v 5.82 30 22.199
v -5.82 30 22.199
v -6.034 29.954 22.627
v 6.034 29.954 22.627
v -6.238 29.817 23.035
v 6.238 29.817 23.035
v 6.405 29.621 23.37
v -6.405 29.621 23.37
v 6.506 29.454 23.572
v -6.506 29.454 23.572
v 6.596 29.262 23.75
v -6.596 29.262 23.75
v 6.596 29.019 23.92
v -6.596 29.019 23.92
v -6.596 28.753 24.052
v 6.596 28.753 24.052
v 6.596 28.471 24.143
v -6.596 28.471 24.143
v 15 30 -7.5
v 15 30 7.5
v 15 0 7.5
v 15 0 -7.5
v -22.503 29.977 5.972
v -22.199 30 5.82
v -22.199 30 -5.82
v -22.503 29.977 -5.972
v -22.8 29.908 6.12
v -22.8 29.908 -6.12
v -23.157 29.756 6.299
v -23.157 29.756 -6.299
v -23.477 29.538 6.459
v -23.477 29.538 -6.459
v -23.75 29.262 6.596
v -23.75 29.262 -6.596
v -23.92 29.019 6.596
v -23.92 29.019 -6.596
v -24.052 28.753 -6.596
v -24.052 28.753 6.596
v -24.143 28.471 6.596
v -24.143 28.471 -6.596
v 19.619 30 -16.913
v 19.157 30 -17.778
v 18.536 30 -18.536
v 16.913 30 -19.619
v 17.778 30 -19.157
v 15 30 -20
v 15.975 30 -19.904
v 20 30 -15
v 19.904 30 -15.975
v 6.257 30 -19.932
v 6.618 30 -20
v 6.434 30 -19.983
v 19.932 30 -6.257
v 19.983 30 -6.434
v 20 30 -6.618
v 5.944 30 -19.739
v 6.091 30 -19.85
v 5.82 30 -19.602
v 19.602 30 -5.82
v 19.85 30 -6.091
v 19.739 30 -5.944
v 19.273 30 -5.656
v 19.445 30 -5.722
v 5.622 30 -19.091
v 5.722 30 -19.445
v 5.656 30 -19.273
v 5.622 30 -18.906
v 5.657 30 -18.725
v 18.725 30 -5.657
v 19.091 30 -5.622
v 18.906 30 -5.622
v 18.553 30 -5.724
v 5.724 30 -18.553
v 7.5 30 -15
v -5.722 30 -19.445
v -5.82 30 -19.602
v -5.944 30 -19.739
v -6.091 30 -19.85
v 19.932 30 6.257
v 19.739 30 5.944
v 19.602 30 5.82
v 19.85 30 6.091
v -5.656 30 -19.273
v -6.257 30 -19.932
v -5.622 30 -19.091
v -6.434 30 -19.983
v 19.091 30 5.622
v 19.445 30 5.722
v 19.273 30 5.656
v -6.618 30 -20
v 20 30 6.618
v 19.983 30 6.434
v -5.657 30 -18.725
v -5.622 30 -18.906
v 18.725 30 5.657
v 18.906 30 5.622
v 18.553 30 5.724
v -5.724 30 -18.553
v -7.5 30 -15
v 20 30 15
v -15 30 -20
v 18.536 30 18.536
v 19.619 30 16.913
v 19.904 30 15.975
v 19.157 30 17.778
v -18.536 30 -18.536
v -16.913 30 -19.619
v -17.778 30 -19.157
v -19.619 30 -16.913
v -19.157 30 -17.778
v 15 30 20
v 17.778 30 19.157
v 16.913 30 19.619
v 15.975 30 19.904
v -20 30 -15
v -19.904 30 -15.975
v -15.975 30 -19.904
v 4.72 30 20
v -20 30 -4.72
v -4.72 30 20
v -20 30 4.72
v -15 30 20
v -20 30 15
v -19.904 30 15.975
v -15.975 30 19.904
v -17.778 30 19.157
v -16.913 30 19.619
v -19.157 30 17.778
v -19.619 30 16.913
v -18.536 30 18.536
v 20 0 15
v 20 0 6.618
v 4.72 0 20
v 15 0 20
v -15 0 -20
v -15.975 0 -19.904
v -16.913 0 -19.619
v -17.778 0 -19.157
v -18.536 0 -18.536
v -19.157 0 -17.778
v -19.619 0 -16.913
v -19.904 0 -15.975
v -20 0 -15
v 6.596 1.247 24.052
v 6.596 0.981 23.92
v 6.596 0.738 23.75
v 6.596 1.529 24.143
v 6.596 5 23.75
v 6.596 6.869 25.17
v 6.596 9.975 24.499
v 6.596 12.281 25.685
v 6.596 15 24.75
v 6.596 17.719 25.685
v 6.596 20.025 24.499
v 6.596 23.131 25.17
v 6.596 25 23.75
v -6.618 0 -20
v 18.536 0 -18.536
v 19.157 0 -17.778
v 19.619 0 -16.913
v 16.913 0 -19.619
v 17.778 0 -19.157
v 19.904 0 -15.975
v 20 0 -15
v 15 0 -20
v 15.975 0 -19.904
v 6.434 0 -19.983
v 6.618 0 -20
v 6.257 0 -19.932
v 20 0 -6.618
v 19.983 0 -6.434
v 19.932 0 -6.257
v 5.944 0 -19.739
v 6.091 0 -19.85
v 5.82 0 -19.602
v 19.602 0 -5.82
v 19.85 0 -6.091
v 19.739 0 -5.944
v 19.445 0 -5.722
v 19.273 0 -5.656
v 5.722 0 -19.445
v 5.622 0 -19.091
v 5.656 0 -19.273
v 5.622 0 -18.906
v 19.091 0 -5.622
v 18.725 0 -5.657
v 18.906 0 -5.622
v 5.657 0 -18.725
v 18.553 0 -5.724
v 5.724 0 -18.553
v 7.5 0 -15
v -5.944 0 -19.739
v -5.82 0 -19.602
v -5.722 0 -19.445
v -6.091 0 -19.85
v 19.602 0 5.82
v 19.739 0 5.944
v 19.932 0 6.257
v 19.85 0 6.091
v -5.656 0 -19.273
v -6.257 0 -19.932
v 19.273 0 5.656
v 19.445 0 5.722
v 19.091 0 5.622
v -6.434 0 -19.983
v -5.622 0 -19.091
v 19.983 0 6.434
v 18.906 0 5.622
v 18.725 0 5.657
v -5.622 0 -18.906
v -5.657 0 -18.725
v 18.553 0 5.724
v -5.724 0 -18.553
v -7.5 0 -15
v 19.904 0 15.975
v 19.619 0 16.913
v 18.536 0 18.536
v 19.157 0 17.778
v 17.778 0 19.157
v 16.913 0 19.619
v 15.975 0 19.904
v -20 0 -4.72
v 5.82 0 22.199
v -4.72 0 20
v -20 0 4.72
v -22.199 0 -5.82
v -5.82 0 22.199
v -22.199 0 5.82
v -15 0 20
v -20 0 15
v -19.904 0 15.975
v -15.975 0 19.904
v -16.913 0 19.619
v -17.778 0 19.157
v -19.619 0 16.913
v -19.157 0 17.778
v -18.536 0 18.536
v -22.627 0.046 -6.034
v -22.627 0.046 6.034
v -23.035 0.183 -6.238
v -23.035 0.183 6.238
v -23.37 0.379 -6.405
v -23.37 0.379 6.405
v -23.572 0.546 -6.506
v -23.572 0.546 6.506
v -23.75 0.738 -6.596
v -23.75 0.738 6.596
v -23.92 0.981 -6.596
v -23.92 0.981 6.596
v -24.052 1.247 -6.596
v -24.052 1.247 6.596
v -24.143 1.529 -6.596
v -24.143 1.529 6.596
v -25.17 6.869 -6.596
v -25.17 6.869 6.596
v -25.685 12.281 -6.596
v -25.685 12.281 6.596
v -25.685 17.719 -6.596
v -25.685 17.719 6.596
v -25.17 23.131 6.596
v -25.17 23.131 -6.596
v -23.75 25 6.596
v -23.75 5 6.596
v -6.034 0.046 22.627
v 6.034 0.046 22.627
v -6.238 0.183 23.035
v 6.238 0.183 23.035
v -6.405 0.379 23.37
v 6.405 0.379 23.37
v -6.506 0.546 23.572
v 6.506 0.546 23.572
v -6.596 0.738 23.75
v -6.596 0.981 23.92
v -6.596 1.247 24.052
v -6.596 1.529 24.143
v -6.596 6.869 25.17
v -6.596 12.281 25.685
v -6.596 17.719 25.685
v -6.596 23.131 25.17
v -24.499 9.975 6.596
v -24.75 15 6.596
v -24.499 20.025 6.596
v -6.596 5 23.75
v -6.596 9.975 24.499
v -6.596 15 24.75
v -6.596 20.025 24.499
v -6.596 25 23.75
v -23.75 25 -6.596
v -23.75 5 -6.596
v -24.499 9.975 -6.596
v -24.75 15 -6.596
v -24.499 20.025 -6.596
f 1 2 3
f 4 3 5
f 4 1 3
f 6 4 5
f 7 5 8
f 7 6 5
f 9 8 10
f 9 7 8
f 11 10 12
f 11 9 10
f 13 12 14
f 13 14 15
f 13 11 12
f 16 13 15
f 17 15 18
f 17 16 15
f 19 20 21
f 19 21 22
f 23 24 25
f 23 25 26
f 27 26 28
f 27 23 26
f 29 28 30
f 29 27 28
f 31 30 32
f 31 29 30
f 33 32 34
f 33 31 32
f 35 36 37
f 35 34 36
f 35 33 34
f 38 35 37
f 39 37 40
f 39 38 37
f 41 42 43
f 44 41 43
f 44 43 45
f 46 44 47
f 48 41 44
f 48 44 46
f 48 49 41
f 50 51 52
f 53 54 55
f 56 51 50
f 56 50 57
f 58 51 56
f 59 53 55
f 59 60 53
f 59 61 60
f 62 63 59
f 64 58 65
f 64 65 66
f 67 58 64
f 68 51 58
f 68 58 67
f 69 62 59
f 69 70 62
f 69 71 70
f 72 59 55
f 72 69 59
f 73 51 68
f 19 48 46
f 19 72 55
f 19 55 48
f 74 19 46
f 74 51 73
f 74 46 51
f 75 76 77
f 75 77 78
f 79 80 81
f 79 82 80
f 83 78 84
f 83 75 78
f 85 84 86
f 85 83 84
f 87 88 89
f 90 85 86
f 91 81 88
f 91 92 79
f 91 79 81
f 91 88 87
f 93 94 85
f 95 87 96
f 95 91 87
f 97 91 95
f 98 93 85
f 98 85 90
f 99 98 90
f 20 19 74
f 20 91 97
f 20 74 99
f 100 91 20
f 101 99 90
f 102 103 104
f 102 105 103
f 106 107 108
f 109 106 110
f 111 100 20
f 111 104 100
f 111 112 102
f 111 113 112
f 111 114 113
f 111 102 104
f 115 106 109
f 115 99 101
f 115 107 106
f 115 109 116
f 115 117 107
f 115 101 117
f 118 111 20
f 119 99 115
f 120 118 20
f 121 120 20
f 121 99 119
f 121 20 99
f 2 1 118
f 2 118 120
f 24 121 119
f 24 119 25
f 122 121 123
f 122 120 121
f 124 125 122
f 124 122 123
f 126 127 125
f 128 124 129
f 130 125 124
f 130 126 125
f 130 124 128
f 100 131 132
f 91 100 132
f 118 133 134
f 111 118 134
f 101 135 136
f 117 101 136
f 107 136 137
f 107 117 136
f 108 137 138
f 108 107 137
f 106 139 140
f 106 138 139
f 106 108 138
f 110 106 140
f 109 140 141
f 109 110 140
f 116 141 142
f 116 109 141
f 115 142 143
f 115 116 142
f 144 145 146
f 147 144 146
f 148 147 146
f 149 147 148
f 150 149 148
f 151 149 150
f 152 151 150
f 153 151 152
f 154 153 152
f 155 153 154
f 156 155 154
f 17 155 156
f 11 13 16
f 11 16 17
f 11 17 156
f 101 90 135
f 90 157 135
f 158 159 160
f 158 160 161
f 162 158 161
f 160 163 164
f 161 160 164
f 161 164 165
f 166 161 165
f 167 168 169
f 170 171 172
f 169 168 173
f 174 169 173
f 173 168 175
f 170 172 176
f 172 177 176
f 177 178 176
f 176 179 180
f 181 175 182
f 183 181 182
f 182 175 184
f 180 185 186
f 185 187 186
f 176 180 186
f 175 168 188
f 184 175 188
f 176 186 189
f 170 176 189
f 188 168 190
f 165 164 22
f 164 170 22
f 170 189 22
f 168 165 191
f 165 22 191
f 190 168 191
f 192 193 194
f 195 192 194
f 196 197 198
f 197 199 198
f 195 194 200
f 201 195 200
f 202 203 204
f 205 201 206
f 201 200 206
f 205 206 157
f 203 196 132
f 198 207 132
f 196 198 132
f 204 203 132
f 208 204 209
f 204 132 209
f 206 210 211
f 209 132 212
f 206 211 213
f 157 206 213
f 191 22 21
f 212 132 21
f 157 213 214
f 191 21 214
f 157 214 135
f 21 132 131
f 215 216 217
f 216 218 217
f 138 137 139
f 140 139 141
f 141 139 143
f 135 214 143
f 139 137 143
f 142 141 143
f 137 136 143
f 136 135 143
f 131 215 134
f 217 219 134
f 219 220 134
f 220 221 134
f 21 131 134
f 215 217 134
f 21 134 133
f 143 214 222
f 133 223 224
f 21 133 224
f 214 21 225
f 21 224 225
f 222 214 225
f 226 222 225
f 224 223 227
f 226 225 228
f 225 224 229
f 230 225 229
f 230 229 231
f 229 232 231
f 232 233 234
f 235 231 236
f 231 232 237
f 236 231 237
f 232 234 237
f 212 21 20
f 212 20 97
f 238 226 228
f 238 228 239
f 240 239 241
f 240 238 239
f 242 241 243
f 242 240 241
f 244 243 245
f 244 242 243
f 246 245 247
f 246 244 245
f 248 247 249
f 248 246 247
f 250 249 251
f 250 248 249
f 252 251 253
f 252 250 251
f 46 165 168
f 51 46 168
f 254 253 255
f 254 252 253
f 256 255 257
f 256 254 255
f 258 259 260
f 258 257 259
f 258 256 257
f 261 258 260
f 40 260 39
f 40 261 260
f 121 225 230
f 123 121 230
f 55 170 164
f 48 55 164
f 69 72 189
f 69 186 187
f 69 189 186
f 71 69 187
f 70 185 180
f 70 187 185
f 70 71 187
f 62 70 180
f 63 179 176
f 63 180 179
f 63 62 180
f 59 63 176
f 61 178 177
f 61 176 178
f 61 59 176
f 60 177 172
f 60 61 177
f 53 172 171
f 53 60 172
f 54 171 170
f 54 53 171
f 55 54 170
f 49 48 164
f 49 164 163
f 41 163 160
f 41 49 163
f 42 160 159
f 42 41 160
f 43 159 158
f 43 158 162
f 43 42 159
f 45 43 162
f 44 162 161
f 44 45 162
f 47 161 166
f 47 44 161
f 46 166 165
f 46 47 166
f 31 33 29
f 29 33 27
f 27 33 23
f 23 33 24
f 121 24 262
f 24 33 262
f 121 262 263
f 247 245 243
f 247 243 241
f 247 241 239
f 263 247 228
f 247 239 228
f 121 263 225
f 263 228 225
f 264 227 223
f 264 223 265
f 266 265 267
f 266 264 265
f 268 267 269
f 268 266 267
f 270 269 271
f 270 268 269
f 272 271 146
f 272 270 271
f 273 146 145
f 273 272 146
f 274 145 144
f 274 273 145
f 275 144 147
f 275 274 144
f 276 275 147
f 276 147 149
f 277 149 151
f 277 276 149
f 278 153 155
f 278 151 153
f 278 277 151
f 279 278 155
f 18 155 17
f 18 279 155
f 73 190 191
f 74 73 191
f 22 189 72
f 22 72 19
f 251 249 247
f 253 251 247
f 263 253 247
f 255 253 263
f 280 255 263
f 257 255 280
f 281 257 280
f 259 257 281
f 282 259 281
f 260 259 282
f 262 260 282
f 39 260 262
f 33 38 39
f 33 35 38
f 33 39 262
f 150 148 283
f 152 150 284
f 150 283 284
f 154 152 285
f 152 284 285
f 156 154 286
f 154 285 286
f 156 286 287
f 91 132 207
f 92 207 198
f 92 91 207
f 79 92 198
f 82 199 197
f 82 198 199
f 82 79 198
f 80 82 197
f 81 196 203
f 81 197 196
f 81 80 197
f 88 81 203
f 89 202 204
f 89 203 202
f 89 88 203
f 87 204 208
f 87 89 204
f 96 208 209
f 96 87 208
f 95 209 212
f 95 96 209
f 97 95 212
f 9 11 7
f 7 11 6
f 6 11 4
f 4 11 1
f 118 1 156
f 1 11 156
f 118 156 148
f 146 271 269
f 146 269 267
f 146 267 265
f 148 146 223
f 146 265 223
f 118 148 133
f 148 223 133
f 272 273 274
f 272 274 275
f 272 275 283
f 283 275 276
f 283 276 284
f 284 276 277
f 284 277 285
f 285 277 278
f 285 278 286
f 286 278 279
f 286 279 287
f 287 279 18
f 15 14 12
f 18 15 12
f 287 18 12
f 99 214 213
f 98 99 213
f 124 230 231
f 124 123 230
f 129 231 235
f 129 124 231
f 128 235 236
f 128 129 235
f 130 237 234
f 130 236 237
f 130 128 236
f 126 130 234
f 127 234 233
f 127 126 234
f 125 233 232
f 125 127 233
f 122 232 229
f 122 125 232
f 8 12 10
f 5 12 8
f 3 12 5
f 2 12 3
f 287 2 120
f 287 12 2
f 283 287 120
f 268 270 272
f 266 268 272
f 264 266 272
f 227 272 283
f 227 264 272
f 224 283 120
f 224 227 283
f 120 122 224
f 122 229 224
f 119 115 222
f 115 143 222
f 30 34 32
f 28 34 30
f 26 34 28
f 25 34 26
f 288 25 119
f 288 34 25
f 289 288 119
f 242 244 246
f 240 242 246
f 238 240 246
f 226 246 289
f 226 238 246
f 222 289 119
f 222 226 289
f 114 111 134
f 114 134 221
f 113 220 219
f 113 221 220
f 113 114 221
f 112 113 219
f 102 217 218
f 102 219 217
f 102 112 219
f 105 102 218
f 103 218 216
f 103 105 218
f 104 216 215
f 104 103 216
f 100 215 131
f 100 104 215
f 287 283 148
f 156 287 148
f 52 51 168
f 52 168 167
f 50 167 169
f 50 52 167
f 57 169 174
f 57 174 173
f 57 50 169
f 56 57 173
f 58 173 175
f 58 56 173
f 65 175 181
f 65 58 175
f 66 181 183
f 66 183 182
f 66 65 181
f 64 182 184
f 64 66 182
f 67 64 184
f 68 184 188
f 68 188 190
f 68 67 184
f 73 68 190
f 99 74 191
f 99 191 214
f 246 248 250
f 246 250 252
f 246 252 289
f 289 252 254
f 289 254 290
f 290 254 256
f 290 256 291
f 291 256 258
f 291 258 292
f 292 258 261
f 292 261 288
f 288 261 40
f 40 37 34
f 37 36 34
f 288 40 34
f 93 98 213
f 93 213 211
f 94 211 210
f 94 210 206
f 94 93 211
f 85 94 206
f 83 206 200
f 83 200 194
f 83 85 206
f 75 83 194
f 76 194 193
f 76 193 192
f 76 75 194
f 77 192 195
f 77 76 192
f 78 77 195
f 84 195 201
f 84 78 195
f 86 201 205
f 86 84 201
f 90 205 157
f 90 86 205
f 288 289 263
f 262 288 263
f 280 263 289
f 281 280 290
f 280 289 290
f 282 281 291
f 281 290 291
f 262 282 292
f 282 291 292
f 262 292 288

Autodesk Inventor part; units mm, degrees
ref_plane "YZ Plane" through (0, 0, 0) normal (1, 0, 0) x (0, 1, 0)
ref_plane "XZ Plane" through (0, 0, 0) normal (0, 1, 0) x (-1, 0, 0)
sketch "Sketch1" plane through (0, 0, 0) normal (0, 1, 0) x (-1, 0, 0)
  line L0 (-20, -20) -> (20, -20)
  line L1 (20, -20) -> (20, 20)
  line L2 (20, 20) -> (-20, 20)
  line L3 (-20, 20) -> (-20, -20)
  line L4 (-20, -20) -> (20, 20) construction
  line L5 (20, -20) -> (-20, 20) construction
  line L6 (20, 0) -> (20, 5)
  line L7 (20, 0) -> (25, 0)
  line L8 (25, 0) -> (25, 7.5)
  line L9 (25, 7.5) -> (20, 5)
  line L10 (25, 0) -> (25, -7.5)
  line L11 (20, 0) -> (20, -5)
  line L12 (20, -5) -> (25, -7.5)
  line L13 (0, 20) -> (5, 20)
  line L14 (0, 20) -> (0, 25)
  line L15 (0, 25) -> (7.5, 25)
  line L16 (7.5, 25) -> (5, 20)
  line L17 (0, 25) -> (-7.5, 25)
  line L18 (0, 20) -> (-5, 20)
  line L19 (-5, 20) -> (-7.5, 25)
  line L20 (0, -20) -> (5, -20)
  line L21 (7.5, -15) -> (5, -20)
  line L22 (0, -20) -> (-5, -20)
  line L23 (0, -20) -> (0, -15)
  line L24 (0, -15) -> (7.5, -15)
  line L25 (0, -15) -> (-7.5, -15)
  line L26 (-5, -20) -> (-7.5, -15)
  line L27 (-20, 0) -> (-20, 5)
  line L28 (-20, 0) -> (-20, -5)
  line L29 (-15, 0) -> (-15, -7.5)
  line L30 (-20, -5) -> (-15, -7.5)
  line L31 (-20, 0) -> (-15, 0)
  line L32 (-15, 7.5) -> (-20, 5)
  line L33 (-15, 0) -> (-15, 7.5)
  line L34 (24.75, 0) -> (24.75, 7.0955)
  line L35 (24.75, 7.0955) -> (20.25, 4.8455)
  line L36 (20.25, 4.8455) -> (20.25, 0)
  line L37 (24.75, 0) -> (24.75, -7.0955)
  line L38 (24.75, -7.0955) -> (20.25, -4.8455)
  line L39 (20.25, -4.8455) -> (20.25, 0)
  line L40 (0, 20.25) -> (4.8455, 20.25)
  line L41 (4.8455, 20.25) -> (7.0955, 24.75)
  line L42 (7.0955, 24.75) -> (0, 24.75)
  line L43 (0, 24.75) -> (-7.0955, 24.75)
  line L44 (-7.0955, 24.75) -> (-4.8455, 20.25)
  line L45 (-4.8455, 20.25) -> (0, 20.25)
  line L46 (24.75, 7.0955) -> (20, 4.7205)
  line L47 (24.75, -7.0955) -> (20, -4.7205)
  line L48 (7.0955, 24.75) -> (4.7205, 20)
  line L49 (-7.0955, 24.75) -> (-4.7205, 20)
  line L50 (25, 0) -> (23.75, 0)
  line L51 (23.75, 0) -> (23.75, 6.875)
  line L52 (23.75, 0) -> (23.75, -6.875)
  line L53 (0, 25) -> (0, 23.75)
  line L54 (0, 23.75) -> (6.875, 23.75)
  line L55 (0, 23.75) -> (-6.875, 23.75)
  point P0 (0, 0)
  point P1 (6.5955, 23.75)
  point P2 (-6.5955, 23.75)
  point P3 (23.75, -6.5955)
  point P4 (23.75, 6.5955)
  dimension "d0" = 40
  dimension "d1" = 40
  dimension "d2" = 5
  dimension "d3" = 5
  dimension "d4" = 7.5
  dimension "d5" = 7.5
  dimension "d6" = 5
  dimension "d9" = 40
  dimension "d16" = 40
  dimension "d21" = 0.25
  dimension "d22" = 0.25
  dimension "d23" = 0.25
  dimension "d24" = 0.25
  dimension "d29" = 1.25
  dimension "d30" = 1.25
extrude "Extrusion1" add sketch "Sketch1" along normal blind 30 contours L3 L30 L29 L33 L32 L2 L1 L0 L21 L24 L25 L26 | L1 L7 L39 L47 | L49 L45 L14 L2 | L1 L46 L36 L7 | L39 L7 L52 L38 | L14 L40 L48 L2 | L44 L55 L14 L45 | L36 L35 L51 L7 | L14 L54 L41 L40
fillet "Fillet1" radius 5 4 edges at (20, 15, 20) (20, 15, -20) (-20, 15, -20) (-20, 15, 20)
fillet "Fillet2" radius 1 4 edges at (20, 15, 5) (20, 15, -5) (5, 15, -20) (-5, 15, -20)
ref_plane "Work Plane1" through (-6.5955, 0, 23.75) normal (1, 0, 0) x (0, 1, 0)
sketch "Sketch2" plane through (-6.5955, 0, 23.75) normal (1, 0, 0) x (0, 1, 0)
  line L0 (0, -3.75) -> (30, -3.75) projected
  line L1 (15, -3.75) -> (15, 2)
  line L2 (30, 0) -> (25, 0)
  line L3 (0, 0) -> (30, 0) projected
  line L4 (0, 0) -> (5, 0)
  arc A0 (30, 0) -> (0, 0) centre (15, -55.25) ccw
  line L5 (15, 2) -> (15, 1)
  arc A1 (25, 0) -> (5, 0) centre (15, -49.5) ccw
  point P0 (0, -23.75)
  dimension "d32" = 5.75
  dimension "d33" = 5
  dimension "d34" = 5
  dimension "d35" = 1
extrude "Extrusion2" add sketch "Sketch2" along normal blind 13.191 contours A1 L3 A0 L1 | L1 A0 L2 A1
fillet "Fillet3" radius 2 2 edges at (0, 30, 23.75) (0, 0, 23.75)
sketch "Sketch3" plane through (0, 30, 0) normal (0, 1, 0) x (1, 0, 0)
  point P0 (0, 0)
pattern_circular "Circular Pattern1" count 2 over 270 about axis through (0, 30, 0) along (0, 1, 0) of "Extrusion2", "Fillet3"
properties part number "base"
